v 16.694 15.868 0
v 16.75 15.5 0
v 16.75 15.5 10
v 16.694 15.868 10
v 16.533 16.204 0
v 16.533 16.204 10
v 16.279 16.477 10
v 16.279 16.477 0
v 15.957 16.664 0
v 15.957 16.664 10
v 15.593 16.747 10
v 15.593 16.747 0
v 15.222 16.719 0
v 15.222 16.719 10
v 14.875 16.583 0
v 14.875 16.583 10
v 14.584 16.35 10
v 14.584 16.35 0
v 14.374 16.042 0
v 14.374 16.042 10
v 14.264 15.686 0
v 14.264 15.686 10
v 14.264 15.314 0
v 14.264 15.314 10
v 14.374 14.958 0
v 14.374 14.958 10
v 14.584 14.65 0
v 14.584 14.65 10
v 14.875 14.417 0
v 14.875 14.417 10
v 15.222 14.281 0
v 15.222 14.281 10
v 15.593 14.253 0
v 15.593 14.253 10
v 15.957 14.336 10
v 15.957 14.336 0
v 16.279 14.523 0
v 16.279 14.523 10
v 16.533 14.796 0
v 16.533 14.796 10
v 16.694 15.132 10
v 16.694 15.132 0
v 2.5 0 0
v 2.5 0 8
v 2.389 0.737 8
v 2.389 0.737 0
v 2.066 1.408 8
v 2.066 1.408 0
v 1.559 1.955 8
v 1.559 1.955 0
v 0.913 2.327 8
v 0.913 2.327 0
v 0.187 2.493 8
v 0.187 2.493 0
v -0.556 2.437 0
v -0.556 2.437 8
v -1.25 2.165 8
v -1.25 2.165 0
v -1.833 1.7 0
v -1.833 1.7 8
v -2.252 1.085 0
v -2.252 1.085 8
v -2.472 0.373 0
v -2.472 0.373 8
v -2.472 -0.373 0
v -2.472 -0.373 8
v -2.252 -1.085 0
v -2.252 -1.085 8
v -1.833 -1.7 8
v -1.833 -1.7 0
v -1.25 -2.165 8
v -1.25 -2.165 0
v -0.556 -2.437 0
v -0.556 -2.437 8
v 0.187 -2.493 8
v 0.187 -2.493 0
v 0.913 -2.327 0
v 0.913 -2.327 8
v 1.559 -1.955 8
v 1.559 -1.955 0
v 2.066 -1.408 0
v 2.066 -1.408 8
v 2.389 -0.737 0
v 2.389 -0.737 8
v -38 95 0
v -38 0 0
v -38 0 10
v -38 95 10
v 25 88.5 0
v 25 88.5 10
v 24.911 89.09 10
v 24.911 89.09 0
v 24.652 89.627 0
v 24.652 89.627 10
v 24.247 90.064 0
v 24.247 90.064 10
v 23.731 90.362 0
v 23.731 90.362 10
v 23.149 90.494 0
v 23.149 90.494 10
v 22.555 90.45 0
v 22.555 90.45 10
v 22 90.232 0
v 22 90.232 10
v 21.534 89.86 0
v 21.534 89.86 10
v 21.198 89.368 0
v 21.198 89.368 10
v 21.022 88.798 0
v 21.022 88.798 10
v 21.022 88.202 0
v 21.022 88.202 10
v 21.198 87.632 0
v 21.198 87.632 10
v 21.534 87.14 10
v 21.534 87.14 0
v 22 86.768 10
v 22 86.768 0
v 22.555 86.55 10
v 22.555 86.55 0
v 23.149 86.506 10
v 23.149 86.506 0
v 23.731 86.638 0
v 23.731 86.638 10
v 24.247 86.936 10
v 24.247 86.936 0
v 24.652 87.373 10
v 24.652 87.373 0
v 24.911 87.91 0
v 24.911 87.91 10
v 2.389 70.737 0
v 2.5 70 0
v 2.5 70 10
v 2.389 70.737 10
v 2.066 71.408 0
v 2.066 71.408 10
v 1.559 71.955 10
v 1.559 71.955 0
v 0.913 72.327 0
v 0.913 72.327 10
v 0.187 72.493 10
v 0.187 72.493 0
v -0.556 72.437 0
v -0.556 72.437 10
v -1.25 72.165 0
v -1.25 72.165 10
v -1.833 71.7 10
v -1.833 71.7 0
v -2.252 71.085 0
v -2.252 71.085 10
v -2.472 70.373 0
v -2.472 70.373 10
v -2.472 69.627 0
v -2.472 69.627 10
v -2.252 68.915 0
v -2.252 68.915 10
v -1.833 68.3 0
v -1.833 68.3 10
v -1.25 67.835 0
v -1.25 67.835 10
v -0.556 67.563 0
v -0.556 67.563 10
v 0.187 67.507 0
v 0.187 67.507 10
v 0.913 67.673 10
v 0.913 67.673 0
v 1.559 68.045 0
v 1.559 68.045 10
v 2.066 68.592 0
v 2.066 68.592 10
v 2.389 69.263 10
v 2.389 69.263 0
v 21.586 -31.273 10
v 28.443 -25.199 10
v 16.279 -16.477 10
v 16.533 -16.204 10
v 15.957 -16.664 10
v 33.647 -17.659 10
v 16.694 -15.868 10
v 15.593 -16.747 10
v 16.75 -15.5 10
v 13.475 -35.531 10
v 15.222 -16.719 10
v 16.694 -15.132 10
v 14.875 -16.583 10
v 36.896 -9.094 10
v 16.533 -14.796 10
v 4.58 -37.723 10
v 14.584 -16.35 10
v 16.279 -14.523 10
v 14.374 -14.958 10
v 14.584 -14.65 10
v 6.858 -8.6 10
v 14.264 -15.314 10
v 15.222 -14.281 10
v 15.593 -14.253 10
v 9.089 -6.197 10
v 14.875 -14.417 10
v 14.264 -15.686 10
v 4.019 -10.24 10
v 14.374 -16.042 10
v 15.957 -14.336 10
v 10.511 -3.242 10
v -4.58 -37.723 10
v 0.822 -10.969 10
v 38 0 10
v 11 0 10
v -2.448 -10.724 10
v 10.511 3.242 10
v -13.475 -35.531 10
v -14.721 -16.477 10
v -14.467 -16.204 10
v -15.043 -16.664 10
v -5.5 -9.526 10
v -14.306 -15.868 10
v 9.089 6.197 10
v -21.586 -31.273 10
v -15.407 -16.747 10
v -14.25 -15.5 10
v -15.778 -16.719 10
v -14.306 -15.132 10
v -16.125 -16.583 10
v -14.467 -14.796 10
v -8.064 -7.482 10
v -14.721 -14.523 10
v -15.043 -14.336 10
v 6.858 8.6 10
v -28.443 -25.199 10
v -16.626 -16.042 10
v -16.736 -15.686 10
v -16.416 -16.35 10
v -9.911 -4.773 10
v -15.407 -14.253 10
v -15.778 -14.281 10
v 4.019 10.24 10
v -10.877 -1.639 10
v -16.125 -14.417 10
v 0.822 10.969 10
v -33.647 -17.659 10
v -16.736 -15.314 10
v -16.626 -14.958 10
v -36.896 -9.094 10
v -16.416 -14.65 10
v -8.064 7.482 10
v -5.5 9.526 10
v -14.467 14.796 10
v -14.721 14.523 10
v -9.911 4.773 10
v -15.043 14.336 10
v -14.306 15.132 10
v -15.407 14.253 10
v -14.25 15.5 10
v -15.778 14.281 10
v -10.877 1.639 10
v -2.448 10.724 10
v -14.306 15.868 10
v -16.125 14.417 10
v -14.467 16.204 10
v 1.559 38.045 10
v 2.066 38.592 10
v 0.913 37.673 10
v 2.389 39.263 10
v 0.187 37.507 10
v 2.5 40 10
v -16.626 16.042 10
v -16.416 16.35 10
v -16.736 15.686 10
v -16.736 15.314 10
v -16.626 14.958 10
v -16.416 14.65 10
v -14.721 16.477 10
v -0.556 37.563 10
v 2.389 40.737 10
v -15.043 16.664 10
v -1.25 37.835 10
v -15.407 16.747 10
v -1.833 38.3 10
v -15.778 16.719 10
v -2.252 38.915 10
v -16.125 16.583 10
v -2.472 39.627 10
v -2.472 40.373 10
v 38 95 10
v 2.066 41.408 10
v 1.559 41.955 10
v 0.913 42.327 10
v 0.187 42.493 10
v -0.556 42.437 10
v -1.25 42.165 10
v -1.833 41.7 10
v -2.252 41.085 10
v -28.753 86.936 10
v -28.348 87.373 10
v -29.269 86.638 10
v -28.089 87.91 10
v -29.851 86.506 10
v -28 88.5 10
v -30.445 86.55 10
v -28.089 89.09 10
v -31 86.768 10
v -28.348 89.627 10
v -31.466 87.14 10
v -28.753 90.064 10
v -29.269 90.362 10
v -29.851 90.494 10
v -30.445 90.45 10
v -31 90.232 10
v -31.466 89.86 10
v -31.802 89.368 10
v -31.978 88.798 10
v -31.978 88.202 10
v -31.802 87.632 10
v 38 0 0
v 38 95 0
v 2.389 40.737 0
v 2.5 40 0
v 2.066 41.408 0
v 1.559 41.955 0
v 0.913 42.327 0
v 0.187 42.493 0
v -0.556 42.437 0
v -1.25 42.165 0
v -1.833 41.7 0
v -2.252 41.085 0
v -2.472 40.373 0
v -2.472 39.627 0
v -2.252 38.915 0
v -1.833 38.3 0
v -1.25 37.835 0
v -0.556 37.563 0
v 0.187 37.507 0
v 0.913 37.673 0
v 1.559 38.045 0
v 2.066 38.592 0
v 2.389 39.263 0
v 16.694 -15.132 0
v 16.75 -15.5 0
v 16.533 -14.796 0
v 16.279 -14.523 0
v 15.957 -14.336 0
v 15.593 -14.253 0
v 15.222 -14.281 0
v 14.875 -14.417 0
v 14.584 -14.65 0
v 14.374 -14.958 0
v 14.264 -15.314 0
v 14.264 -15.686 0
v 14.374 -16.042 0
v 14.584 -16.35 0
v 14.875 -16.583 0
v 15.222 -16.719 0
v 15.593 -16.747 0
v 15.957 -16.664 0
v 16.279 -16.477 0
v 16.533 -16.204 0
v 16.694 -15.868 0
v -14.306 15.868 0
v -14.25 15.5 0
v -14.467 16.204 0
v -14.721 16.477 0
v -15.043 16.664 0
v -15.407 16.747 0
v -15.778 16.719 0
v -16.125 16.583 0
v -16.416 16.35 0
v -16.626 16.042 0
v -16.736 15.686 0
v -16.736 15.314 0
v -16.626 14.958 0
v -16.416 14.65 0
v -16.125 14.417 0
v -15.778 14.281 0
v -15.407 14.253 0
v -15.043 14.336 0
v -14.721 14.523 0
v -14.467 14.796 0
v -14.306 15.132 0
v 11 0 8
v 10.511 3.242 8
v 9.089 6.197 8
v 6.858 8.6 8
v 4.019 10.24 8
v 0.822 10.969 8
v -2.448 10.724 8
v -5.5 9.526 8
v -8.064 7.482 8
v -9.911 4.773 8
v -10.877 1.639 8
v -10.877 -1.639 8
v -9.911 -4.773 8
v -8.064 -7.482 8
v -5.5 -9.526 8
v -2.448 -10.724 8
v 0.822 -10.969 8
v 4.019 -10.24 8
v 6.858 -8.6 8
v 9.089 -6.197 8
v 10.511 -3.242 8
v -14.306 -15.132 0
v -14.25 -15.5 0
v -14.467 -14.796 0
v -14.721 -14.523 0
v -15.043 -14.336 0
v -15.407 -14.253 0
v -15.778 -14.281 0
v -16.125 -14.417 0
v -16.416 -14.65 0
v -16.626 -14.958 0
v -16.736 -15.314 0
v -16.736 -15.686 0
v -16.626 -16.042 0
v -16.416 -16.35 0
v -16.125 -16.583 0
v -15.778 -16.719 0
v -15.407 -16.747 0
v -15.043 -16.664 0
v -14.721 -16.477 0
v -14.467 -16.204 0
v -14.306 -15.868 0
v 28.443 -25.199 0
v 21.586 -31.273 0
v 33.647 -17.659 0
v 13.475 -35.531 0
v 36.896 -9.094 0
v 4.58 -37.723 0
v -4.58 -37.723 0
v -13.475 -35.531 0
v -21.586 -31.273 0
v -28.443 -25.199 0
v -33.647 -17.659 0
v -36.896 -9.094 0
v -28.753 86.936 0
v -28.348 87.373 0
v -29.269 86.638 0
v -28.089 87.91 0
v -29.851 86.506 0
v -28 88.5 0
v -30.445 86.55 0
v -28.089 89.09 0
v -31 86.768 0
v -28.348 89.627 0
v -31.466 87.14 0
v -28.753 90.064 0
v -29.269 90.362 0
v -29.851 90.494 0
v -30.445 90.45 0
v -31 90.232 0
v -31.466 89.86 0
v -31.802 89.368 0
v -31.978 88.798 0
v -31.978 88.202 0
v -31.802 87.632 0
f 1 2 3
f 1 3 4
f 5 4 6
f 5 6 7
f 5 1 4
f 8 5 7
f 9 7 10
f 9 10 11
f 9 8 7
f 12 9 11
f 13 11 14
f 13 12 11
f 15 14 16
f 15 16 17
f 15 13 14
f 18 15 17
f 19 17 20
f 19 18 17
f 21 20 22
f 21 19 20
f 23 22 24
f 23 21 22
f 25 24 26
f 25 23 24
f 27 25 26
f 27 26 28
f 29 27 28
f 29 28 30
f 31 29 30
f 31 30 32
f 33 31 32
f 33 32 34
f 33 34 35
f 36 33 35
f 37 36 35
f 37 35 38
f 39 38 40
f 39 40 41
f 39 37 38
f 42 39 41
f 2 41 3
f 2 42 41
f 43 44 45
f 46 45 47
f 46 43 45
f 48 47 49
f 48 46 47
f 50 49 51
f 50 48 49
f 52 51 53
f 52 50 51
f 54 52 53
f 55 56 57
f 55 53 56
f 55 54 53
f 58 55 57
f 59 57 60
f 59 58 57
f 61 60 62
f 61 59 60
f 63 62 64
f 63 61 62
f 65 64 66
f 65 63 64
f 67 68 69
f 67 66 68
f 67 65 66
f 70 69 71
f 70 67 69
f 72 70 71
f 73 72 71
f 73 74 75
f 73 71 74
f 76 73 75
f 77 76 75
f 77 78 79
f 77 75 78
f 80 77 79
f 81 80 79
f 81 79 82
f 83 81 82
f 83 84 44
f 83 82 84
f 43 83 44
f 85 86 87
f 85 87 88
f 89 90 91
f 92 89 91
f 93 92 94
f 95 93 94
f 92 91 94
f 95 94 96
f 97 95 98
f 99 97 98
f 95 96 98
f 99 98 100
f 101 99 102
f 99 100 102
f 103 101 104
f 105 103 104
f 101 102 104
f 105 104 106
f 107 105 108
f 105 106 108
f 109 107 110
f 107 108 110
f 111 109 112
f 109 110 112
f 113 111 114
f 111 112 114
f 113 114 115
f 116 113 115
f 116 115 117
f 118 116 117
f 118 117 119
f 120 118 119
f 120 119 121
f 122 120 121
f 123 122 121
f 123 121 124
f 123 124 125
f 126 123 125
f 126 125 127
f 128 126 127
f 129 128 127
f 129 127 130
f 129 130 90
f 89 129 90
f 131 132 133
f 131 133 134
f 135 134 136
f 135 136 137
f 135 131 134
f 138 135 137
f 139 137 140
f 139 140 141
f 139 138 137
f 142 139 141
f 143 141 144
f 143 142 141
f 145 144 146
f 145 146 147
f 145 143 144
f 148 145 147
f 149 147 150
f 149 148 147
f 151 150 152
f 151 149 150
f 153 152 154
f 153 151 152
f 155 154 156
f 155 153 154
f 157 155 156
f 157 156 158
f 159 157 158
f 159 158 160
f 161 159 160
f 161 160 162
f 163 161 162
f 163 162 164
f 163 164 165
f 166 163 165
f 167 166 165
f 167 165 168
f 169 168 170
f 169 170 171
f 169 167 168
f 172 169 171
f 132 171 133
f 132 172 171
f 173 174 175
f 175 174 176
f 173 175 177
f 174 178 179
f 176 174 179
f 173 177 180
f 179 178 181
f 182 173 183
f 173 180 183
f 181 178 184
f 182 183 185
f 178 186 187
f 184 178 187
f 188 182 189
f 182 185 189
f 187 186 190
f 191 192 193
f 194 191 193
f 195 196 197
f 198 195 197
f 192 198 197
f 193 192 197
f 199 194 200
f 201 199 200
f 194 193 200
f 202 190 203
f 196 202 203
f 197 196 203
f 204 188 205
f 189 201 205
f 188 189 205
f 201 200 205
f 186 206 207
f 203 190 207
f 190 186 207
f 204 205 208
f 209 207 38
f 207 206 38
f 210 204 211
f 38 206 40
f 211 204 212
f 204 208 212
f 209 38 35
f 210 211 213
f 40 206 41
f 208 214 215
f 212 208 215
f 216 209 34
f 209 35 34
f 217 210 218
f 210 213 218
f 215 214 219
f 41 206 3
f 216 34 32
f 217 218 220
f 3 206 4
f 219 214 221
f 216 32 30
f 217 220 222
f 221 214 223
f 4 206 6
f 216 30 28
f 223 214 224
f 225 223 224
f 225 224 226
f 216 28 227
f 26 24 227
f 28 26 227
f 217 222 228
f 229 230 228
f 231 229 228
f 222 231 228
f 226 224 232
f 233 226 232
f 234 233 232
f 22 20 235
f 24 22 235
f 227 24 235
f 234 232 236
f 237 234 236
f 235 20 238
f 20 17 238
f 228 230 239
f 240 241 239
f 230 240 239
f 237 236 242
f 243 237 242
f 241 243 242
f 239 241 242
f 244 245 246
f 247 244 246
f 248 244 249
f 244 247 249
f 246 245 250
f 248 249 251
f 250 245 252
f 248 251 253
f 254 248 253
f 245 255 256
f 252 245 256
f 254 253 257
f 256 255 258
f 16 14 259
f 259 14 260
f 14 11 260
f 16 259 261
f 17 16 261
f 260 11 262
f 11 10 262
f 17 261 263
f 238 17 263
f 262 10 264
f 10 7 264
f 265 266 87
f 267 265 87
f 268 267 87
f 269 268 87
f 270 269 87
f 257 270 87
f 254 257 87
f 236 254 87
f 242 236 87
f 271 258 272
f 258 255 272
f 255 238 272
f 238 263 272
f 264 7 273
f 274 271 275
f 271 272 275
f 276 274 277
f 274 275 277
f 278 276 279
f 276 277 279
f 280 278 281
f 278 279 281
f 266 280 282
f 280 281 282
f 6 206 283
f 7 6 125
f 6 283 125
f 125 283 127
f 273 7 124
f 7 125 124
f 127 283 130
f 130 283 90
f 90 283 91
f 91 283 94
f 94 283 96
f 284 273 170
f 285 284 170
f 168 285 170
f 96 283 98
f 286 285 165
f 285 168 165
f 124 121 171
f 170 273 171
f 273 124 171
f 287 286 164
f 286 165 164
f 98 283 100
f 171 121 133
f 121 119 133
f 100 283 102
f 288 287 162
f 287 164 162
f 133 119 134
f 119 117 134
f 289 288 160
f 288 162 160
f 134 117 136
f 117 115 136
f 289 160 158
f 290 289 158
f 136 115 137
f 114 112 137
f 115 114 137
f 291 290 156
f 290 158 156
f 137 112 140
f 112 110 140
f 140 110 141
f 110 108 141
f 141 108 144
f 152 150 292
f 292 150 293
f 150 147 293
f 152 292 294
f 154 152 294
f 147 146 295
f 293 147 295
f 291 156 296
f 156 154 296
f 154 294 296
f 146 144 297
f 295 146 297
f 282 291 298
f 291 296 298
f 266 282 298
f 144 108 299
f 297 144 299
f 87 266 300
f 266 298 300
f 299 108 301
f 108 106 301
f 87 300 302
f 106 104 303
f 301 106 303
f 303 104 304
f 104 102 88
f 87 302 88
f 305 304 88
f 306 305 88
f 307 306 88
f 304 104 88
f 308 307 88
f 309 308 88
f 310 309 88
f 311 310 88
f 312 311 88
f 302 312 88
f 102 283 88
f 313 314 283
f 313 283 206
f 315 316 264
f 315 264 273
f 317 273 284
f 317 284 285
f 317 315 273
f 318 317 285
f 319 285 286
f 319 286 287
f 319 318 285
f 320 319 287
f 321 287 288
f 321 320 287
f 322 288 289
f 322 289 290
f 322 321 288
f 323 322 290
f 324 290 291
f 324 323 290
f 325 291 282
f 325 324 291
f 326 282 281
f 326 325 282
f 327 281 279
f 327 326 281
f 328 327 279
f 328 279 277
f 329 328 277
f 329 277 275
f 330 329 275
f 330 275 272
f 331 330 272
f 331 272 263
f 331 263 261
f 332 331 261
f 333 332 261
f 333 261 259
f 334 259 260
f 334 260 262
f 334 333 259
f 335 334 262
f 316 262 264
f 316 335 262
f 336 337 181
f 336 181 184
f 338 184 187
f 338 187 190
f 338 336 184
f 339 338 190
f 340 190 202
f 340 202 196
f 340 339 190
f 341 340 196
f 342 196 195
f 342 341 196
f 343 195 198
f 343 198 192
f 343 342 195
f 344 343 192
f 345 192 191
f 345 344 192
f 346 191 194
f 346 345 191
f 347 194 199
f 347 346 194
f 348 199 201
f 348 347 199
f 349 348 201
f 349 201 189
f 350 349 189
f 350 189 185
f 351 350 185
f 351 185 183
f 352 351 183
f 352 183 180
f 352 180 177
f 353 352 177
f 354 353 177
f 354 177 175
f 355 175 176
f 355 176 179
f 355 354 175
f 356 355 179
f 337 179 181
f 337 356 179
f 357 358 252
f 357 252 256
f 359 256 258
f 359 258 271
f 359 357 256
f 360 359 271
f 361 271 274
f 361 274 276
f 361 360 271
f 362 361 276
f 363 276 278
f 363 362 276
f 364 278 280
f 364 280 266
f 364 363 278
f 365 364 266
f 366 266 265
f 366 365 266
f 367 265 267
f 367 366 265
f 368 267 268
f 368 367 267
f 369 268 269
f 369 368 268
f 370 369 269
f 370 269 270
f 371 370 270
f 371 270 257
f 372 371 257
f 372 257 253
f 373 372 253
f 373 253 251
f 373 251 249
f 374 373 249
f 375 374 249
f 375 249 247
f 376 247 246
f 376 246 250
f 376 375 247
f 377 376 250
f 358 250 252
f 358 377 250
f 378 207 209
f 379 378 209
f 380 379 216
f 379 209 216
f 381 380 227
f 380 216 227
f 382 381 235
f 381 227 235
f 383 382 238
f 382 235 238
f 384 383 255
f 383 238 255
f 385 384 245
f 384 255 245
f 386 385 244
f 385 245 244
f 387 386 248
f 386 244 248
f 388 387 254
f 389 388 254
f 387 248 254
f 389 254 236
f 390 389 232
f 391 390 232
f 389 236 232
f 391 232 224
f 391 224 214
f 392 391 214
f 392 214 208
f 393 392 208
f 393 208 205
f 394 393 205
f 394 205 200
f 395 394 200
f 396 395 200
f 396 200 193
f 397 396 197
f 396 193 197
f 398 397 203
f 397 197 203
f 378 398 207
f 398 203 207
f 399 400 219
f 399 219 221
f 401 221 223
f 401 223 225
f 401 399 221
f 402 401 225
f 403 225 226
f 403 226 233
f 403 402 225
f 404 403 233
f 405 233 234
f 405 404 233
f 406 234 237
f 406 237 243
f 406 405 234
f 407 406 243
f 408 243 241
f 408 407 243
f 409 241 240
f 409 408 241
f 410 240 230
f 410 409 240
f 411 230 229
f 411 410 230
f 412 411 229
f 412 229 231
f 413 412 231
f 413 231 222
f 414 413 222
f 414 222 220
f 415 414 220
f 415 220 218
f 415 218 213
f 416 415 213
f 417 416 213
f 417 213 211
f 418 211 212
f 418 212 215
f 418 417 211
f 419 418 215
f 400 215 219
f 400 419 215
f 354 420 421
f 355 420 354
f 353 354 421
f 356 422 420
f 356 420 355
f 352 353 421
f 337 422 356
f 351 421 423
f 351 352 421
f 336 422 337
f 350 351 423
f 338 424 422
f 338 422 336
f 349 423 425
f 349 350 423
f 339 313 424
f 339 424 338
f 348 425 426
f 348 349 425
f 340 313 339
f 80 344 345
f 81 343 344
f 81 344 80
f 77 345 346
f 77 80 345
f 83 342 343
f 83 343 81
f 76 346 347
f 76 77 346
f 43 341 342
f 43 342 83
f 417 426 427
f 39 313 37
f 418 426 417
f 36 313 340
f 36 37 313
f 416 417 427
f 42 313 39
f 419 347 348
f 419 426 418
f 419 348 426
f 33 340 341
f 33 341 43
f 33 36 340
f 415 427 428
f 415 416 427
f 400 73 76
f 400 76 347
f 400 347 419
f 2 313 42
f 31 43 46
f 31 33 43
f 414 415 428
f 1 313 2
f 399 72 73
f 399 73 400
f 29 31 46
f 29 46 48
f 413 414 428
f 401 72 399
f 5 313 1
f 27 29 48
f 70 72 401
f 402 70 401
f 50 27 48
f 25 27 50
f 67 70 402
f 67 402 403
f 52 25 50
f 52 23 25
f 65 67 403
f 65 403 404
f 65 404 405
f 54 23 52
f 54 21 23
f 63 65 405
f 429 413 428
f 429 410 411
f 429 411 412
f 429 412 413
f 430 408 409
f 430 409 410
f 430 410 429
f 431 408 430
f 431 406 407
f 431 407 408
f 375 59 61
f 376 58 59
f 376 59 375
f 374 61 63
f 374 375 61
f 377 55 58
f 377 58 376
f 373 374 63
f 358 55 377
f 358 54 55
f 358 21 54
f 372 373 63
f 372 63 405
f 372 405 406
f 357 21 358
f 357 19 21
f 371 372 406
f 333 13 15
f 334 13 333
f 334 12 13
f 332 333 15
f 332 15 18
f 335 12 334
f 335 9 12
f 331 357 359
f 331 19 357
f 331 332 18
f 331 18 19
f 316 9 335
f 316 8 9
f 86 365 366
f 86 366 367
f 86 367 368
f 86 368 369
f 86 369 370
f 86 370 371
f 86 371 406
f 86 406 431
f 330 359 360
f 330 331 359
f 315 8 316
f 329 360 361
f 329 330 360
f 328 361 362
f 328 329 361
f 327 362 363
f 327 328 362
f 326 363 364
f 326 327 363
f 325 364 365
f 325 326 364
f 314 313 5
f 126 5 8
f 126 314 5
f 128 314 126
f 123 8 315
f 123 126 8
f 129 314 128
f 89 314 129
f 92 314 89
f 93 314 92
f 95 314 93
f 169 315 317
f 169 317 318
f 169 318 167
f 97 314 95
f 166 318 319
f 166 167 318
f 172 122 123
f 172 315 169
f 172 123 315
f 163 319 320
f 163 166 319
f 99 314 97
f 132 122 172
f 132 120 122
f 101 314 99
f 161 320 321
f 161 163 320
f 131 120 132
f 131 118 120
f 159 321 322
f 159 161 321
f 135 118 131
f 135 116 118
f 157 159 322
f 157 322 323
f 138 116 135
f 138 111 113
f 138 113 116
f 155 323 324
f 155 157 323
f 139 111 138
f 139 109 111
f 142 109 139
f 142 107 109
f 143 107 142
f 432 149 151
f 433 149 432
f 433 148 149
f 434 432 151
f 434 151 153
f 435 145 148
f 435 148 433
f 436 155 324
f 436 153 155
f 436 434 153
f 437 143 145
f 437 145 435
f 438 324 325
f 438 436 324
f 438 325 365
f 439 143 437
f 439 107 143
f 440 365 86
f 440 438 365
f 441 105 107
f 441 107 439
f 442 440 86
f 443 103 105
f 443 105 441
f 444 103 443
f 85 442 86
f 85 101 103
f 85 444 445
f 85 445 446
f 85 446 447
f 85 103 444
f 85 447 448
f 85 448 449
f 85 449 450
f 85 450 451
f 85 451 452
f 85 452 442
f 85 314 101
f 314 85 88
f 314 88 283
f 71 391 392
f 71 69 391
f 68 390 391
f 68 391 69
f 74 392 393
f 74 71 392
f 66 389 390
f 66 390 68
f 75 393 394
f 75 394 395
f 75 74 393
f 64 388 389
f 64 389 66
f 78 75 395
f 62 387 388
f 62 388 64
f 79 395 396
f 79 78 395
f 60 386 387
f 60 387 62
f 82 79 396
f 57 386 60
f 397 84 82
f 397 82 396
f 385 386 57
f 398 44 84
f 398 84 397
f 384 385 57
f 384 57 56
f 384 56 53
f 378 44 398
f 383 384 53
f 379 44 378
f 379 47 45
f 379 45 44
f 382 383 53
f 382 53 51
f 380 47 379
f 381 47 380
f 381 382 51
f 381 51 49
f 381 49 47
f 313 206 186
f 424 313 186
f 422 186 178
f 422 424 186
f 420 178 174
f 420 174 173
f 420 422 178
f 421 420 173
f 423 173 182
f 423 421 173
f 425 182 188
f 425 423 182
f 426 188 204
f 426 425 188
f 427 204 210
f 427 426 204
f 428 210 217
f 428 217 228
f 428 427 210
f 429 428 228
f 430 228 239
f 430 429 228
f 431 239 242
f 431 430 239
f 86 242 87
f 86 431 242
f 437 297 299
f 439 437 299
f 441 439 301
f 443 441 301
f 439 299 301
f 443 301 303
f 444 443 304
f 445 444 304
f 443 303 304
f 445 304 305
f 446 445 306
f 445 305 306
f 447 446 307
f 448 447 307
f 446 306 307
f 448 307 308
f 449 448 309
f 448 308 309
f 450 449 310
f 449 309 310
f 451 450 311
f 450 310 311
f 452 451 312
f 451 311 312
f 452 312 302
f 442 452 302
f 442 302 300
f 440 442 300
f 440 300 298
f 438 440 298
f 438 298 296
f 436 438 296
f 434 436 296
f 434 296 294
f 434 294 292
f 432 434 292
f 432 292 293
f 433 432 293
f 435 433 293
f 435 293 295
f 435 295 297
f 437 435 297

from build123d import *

# Parameters (mm, degrees)
CROQUIS1_R              = 2.5
CROQUIS1_R_2            = 1.25
SALIENTE_EXTRUIR1_DEPTH = 10
CROQUIS3_R              = 11
CORTAR_EXTRUIR1_DEPTH   = 2
CROQUIS4_R              = 2
CORTAR_EXTRUIR2_DEPTH   = 103.805641869


with BuildPart() as part:
    # Croquis1 → Saliente-Extruir1 (new body)
    with BuildSketch(Plane.XY):
        with BuildLine():
            Line((-38, 0), (-38, 95))
            Line((-38, 95), (38, 95))
            Line((38, 95), (38, 0))
            ThreePointArc((38, 0), (0, -38), (-38, 0))
        make_face()
        with Locations((0, 40)):
            Circle(CROQUIS1_R, mode=Mode.SUBTRACT)
        Circle(CROQUIS1_R, mode=Mode.SUBTRACT)
        with Locations((0, 70)):
            Circle(CROQUIS1_R, mode=Mode.SUBTRACT)
        with Locations((-15.5, 15.5)):
            Circle(CROQUIS1_R_2, mode=Mode.SUBTRACT)
        with Locations((15.5, 15.5)):
            Circle(CROQUIS1_R_2, mode=Mode.SUBTRACT)
        with Locations((15.5, -15.5)):
            Circle(CROQUIS1_R_2, mode=Mode.SUBTRACT)
        with Locations((-15.5, -15.5)):
            Circle(CROQUIS1_R_2, mode=Mode.SUBTRACT)
    extrude(amount=SALIENTE_EXTRUIR1_DEPTH)

    # Croquis3 → Cortar-Extruir1 (cut)
    with BuildSketch(Plane.XY.offset(10)):
        Circle(CROQUIS3_R)
    extrude(amount=-CORTAR_EXTRUIR1_DEPTH, mode=Mode.SUBTRACT)

    # Croquis4 → Cortar-Extruir2 (cut, through all)
    with BuildSketch(Plane.XY.offset(10)):
        with Locations((-30, 88.5)):
            Circle(CROQUIS4_R)
        with Locations((23, 88.5)):
            Circle(CROQUIS4_R)
    extrude(amount=-CORTAR_EXTRUIR2_DEPTH, mode=Mode.SUBTRACT)


solid = part.part
